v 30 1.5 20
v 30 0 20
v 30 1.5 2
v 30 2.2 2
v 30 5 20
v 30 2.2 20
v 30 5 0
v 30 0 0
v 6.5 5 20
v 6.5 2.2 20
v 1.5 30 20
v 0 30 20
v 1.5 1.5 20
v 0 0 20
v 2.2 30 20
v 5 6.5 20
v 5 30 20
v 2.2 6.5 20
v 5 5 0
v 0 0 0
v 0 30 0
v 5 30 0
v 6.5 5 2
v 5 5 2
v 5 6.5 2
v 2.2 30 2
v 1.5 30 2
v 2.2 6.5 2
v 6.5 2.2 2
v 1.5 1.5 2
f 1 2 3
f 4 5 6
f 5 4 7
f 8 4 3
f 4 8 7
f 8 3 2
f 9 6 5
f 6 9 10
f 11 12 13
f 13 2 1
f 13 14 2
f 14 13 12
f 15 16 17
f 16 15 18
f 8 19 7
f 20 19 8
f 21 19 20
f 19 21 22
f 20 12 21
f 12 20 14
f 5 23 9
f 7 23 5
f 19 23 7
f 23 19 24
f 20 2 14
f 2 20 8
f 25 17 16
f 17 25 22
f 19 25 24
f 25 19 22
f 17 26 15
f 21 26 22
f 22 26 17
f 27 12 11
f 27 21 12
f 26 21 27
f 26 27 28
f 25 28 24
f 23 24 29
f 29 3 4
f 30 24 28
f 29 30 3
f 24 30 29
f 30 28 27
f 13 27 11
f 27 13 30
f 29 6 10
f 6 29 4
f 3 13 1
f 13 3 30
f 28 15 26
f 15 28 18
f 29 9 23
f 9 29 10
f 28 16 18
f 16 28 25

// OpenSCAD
ht = 10;
difference(){
    union(){
      cube([30,5,10 + ht]);
       cube([5,30,10 + ht]);
    };
translate([1.5,1.5,2])
cube([30,0.7,10 + ht]);
translate([1.5,1.5,2])
cube([0.7,30,10 + ht]);
translate([1.5,1.5,2])
cube([5,5,10 + ht]);
}
